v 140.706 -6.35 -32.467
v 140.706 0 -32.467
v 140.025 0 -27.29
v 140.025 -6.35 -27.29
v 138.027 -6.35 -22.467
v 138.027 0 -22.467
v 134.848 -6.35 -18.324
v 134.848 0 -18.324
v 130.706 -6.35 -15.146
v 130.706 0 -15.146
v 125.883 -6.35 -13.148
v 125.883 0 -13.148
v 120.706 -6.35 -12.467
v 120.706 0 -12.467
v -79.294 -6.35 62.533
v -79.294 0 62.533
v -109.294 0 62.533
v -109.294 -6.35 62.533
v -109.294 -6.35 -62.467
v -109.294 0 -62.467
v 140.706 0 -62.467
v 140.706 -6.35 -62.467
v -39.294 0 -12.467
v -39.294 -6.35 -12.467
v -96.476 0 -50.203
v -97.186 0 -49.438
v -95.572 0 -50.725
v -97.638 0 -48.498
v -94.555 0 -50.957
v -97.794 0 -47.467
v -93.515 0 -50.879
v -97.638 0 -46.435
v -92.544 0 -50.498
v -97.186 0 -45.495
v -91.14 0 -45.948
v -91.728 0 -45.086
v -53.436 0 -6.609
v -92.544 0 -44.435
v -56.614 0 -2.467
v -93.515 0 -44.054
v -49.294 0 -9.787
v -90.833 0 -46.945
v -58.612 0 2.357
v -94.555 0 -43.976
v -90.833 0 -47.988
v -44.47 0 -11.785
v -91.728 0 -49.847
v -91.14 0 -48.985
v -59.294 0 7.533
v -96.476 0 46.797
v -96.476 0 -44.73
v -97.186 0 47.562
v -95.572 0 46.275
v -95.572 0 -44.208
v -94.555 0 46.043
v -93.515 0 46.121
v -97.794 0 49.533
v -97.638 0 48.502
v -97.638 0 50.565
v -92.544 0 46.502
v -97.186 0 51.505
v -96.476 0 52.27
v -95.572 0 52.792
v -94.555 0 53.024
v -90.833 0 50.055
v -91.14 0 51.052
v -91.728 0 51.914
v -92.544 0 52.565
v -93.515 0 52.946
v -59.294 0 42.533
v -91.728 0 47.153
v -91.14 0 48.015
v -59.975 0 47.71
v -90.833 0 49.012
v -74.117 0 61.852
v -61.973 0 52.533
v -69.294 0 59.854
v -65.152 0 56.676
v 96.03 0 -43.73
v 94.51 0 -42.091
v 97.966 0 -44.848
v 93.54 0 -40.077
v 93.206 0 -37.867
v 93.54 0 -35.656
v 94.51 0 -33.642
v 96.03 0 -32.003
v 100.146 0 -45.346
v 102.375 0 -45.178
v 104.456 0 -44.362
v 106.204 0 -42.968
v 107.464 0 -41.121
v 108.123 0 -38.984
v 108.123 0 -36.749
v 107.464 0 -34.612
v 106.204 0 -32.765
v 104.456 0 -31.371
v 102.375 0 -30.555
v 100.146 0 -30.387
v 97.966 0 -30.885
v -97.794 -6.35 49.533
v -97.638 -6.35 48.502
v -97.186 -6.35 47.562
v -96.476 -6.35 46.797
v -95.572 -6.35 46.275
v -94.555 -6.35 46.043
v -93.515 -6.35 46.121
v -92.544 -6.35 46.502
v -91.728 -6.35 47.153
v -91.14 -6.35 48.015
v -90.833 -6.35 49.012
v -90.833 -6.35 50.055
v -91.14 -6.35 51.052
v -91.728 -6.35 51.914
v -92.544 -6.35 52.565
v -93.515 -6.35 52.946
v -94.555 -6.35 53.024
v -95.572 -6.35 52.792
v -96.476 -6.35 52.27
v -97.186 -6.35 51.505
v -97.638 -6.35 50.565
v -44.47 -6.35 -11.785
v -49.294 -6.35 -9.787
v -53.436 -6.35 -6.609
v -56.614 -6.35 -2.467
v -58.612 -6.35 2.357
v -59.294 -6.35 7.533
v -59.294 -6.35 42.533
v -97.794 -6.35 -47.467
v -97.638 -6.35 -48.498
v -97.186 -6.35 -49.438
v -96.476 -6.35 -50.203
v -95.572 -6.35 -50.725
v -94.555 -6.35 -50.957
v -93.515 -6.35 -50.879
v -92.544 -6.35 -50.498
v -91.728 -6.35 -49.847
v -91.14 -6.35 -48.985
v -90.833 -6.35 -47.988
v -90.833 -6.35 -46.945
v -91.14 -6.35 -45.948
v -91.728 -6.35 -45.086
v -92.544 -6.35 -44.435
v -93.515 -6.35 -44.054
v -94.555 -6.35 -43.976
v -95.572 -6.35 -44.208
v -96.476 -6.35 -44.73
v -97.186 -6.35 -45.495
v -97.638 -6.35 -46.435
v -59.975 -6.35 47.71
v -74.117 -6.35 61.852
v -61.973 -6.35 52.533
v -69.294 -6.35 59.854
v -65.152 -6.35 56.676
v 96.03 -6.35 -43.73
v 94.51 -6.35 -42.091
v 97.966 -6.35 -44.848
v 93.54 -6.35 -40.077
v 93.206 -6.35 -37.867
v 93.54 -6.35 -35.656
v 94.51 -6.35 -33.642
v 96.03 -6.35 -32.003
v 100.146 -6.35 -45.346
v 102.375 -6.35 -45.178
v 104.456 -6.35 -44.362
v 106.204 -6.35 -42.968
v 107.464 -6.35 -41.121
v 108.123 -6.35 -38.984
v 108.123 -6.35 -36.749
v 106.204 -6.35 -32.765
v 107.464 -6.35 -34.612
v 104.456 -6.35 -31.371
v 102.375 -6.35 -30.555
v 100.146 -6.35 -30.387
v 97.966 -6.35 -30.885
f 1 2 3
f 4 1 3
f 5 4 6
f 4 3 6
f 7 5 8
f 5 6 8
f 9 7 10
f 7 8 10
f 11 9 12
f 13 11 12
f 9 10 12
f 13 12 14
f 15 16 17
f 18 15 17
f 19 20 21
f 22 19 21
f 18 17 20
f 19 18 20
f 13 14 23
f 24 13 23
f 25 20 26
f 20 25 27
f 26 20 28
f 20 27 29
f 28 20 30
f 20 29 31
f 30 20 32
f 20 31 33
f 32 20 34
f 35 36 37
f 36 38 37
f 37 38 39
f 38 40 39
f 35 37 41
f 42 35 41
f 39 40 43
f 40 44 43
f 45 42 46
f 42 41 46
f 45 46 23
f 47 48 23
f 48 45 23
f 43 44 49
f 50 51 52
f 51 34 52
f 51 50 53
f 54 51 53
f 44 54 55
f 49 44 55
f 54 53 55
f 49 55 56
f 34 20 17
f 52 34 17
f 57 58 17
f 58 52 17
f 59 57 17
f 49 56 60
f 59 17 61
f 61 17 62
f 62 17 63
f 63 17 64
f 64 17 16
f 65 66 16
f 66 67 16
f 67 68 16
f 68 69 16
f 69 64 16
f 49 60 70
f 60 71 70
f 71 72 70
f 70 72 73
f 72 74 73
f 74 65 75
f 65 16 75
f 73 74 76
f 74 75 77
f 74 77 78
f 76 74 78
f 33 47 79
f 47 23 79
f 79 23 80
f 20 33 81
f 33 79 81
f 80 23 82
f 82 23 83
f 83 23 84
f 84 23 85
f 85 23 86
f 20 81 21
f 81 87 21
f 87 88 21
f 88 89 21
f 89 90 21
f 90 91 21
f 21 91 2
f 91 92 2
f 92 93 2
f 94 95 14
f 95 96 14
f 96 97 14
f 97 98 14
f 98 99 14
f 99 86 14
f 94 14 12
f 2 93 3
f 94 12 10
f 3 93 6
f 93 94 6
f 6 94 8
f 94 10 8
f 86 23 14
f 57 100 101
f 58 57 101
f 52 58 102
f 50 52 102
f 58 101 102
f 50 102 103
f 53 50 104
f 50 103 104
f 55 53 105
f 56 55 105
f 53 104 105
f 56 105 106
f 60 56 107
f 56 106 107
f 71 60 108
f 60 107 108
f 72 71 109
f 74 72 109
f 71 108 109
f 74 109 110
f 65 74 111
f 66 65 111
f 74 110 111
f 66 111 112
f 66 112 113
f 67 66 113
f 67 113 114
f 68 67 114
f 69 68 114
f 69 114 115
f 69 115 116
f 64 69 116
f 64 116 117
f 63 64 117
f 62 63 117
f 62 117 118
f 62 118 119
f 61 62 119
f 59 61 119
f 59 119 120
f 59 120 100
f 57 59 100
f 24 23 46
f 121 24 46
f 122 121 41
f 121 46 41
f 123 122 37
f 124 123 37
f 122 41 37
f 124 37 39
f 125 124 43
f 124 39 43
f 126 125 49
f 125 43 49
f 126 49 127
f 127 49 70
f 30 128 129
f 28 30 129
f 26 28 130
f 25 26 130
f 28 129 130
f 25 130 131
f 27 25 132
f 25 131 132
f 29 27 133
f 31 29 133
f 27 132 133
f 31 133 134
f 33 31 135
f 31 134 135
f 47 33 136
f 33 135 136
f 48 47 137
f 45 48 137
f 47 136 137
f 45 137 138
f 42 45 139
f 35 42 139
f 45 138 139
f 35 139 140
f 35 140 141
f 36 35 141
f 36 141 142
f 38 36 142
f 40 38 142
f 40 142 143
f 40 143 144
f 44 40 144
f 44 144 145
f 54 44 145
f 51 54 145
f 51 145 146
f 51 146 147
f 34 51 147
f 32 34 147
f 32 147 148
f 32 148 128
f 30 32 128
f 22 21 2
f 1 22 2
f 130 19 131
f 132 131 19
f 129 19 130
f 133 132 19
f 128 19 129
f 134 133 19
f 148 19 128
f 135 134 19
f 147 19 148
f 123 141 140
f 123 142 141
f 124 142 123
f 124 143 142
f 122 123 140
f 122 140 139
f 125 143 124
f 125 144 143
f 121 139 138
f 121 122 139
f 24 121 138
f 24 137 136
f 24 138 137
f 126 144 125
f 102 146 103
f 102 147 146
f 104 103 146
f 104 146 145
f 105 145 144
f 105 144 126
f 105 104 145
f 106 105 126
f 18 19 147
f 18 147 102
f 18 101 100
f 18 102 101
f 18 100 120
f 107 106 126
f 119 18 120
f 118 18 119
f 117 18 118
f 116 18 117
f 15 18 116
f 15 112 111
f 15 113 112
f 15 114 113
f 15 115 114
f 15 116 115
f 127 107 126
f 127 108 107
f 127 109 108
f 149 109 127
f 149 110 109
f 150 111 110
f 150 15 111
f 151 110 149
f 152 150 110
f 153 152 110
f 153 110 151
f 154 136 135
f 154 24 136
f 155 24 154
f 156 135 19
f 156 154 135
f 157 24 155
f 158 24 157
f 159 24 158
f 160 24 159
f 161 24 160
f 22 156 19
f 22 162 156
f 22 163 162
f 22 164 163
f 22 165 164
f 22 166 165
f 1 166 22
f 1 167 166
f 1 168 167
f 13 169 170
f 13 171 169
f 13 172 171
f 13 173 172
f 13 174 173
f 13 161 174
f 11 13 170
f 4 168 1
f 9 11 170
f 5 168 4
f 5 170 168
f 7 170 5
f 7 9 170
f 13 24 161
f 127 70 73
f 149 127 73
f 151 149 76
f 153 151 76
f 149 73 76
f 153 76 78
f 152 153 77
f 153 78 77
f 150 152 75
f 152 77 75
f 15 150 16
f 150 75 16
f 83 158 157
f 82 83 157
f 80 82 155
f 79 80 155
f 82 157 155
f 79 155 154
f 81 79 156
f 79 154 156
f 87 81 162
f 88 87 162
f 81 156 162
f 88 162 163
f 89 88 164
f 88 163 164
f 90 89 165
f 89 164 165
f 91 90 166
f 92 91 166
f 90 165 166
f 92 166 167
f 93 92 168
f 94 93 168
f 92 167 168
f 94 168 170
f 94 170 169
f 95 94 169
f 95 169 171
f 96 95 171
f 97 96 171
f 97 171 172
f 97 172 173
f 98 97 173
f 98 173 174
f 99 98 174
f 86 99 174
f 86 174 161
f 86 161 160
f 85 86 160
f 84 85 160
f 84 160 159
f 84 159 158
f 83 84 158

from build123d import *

# Parameters (mm, degrees)
F1_DEPTH = 6.35
F3_D     = 7
F4_D     = 15


with BuildPart() as f1:
    # F0 (on Front) → F1 (new body)
    with BuildSketch(Plane.XZ):
        with BuildLine():
            Line((-79.2936884003, 62.5334825695), (-109.2936884003, 62.5334825695))
            Line((-109.2936884003, 62.5334825695), (-109.2936884003, -62.4665174305))
            Line((-109.2936884003, -62.4665174305), (140.7063115997, -62.4665174305))
            Line((140.7063115997, -62.4665174305), (140.7063115997, -32.4665174305))
            ThreePointArc((140.7063115997, -32.4665174305), (134.8484472234, -18.3243818068), (120.7063115997, -12.4665174305))
            Line((120.7063115997, -12.4665174305), (-39.2936884003, -12.4665174305))
            ThreePointArc((-39.2936884003, -12.4665174305), (-53.435824024, -6.6086530543), (-59.2936884003, 7.5334825695))
            Line((-59.2936884003, 7.5334825695), (-59.2936884003, 42.5334825695))
            ThreePointArc((-59.2936884003, 42.5334825695), (-65.1515527766, 56.6756181932), (-79.2936884003, 62.5334825695))
        make_face()
    extrude(amount=F1_DEPTH)

    # F3 (through all)
    with Locations(Plane(origin=(0, 0, 0), x_dir=(1, 0, 0), z_dir=(0, 1, 0))):
        with Locations((-94.2936884003, -49.5334825695), (-94.2936884003, 47.4665174305)):
            Hole(F3_D / 2)

    # F4 (through all)
    with Locations(Plane(origin=(0, 0, 0), x_dir=(1, 0, 0), z_dir=(0, 1, 0))):
        with Locations((100.7063115997, 37.8665174305)):
            Hole(F4_D / 2)


solid = f1.part
